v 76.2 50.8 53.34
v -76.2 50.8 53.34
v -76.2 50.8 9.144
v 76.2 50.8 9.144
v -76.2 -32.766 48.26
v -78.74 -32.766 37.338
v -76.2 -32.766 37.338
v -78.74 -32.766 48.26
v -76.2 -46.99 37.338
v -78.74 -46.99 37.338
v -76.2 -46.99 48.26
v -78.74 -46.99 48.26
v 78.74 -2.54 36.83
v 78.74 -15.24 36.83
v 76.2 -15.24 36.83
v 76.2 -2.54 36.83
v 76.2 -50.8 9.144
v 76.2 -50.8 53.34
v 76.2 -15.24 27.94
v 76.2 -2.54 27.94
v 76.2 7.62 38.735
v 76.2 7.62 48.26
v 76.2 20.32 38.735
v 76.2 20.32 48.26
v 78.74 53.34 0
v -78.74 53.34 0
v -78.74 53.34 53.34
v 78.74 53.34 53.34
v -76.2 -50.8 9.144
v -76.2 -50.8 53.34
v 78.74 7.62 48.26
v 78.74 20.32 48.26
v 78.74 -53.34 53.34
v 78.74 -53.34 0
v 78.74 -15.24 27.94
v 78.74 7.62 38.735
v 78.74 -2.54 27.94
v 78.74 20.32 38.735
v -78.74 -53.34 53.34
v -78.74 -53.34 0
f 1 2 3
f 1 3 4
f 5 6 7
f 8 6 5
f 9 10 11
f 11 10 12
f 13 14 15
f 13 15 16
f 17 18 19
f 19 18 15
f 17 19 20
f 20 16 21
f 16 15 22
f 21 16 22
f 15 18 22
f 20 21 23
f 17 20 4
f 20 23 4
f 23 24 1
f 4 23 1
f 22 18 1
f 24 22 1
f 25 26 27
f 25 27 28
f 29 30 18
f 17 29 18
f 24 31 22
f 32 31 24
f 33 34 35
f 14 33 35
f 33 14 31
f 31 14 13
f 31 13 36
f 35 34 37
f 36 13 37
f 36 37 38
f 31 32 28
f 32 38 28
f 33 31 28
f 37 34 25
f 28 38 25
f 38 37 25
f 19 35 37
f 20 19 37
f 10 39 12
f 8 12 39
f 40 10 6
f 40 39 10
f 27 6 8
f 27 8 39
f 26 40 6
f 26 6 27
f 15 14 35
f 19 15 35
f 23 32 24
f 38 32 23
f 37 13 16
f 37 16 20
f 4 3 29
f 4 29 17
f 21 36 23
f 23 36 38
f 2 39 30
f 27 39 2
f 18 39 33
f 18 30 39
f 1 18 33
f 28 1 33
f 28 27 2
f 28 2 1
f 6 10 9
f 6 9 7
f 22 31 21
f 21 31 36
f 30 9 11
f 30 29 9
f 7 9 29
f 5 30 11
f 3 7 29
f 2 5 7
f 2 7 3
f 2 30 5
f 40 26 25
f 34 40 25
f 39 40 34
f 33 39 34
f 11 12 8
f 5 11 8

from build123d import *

# Parameters (mm, degrees)
SKETCH1_W           = 157.48
SKETCH1_H           = 106.68
BOSS_EXTRUDE1_DEPTH = 53.34
SKETCH3_W           = 152.4
SKETCH3_H           = 101.6
CUT_EXTRUDE1_DEPTH  = 44.196
SKETCH4_W           = 8.89
SKETCH4_H           = 12.7
CUT_EXTRUDE2_DEPTH  = 43.18
SKETCH6_W           = 10.922
SKETCH6_H           = 14.224
CUT_EXTRUDE3_DEPTH  = 43.18
SKETCH7_W           = 9.525
SKETCH7_H           = 12.7
CUT_EXTRUDE4_DEPTH  = 12.7


with BuildPart() as part:
    # Sketch1 → Boss-Extrude1 (new body)
    with BuildSketch(Plane.XY):
        Rectangle(SKETCH1_W, SKETCH1_H)
    extrude(amount=BOSS_EXTRUDE1_DEPTH)

    # Sketch3 → Cut-Extrude1 (cut)
    with BuildSketch(Plane.XY.offset(53.34)):
        Rectangle(SKETCH3_W, SKETCH3_H)
    extrude(amount=-CUT_EXTRUDE1_DEPTH, mode=Mode.SUBTRACT)

    # Sketch4 → Cut-Extrude2 (cut)
    with BuildSketch(Plane(origin=(78.74, 0, 0), x_dir=(0, 0, -1), z_dir=(1, 0, 0))):
        with Locations((-32.385, -8.89)):
            Rectangle(SKETCH4_W, SKETCH4_H)
    extrude(amount=-CUT_EXTRUDE2_DEPTH, mode=Mode.SUBTRACT)

    # Sketch6 → Cut-Extrude3 (cut)
    with BuildSketch(Plane.ZY.offset(78.74)):
        with Locations((42.799, -39.878)):
            Rectangle(SKETCH6_W, SKETCH6_H)
    extrude(amount=-CUT_EXTRUDE3_DEPTH, mode=Mode.SUBTRACT)

    # Sketch7 → Cut-Extrude4 (cut)
    with BuildSketch(Plane(origin=(78.74, 0, 0), x_dir=(0, 0, -1), z_dir=(1, 0, 0))):
        with Locations((-43.4975, 13.97)):
            Rectangle(SKETCH7_W, SKETCH7_H)
    extrude(amount=-CUT_EXTRUDE4_DEPTH, mode=Mode.SUBTRACT)


solid = part.part
